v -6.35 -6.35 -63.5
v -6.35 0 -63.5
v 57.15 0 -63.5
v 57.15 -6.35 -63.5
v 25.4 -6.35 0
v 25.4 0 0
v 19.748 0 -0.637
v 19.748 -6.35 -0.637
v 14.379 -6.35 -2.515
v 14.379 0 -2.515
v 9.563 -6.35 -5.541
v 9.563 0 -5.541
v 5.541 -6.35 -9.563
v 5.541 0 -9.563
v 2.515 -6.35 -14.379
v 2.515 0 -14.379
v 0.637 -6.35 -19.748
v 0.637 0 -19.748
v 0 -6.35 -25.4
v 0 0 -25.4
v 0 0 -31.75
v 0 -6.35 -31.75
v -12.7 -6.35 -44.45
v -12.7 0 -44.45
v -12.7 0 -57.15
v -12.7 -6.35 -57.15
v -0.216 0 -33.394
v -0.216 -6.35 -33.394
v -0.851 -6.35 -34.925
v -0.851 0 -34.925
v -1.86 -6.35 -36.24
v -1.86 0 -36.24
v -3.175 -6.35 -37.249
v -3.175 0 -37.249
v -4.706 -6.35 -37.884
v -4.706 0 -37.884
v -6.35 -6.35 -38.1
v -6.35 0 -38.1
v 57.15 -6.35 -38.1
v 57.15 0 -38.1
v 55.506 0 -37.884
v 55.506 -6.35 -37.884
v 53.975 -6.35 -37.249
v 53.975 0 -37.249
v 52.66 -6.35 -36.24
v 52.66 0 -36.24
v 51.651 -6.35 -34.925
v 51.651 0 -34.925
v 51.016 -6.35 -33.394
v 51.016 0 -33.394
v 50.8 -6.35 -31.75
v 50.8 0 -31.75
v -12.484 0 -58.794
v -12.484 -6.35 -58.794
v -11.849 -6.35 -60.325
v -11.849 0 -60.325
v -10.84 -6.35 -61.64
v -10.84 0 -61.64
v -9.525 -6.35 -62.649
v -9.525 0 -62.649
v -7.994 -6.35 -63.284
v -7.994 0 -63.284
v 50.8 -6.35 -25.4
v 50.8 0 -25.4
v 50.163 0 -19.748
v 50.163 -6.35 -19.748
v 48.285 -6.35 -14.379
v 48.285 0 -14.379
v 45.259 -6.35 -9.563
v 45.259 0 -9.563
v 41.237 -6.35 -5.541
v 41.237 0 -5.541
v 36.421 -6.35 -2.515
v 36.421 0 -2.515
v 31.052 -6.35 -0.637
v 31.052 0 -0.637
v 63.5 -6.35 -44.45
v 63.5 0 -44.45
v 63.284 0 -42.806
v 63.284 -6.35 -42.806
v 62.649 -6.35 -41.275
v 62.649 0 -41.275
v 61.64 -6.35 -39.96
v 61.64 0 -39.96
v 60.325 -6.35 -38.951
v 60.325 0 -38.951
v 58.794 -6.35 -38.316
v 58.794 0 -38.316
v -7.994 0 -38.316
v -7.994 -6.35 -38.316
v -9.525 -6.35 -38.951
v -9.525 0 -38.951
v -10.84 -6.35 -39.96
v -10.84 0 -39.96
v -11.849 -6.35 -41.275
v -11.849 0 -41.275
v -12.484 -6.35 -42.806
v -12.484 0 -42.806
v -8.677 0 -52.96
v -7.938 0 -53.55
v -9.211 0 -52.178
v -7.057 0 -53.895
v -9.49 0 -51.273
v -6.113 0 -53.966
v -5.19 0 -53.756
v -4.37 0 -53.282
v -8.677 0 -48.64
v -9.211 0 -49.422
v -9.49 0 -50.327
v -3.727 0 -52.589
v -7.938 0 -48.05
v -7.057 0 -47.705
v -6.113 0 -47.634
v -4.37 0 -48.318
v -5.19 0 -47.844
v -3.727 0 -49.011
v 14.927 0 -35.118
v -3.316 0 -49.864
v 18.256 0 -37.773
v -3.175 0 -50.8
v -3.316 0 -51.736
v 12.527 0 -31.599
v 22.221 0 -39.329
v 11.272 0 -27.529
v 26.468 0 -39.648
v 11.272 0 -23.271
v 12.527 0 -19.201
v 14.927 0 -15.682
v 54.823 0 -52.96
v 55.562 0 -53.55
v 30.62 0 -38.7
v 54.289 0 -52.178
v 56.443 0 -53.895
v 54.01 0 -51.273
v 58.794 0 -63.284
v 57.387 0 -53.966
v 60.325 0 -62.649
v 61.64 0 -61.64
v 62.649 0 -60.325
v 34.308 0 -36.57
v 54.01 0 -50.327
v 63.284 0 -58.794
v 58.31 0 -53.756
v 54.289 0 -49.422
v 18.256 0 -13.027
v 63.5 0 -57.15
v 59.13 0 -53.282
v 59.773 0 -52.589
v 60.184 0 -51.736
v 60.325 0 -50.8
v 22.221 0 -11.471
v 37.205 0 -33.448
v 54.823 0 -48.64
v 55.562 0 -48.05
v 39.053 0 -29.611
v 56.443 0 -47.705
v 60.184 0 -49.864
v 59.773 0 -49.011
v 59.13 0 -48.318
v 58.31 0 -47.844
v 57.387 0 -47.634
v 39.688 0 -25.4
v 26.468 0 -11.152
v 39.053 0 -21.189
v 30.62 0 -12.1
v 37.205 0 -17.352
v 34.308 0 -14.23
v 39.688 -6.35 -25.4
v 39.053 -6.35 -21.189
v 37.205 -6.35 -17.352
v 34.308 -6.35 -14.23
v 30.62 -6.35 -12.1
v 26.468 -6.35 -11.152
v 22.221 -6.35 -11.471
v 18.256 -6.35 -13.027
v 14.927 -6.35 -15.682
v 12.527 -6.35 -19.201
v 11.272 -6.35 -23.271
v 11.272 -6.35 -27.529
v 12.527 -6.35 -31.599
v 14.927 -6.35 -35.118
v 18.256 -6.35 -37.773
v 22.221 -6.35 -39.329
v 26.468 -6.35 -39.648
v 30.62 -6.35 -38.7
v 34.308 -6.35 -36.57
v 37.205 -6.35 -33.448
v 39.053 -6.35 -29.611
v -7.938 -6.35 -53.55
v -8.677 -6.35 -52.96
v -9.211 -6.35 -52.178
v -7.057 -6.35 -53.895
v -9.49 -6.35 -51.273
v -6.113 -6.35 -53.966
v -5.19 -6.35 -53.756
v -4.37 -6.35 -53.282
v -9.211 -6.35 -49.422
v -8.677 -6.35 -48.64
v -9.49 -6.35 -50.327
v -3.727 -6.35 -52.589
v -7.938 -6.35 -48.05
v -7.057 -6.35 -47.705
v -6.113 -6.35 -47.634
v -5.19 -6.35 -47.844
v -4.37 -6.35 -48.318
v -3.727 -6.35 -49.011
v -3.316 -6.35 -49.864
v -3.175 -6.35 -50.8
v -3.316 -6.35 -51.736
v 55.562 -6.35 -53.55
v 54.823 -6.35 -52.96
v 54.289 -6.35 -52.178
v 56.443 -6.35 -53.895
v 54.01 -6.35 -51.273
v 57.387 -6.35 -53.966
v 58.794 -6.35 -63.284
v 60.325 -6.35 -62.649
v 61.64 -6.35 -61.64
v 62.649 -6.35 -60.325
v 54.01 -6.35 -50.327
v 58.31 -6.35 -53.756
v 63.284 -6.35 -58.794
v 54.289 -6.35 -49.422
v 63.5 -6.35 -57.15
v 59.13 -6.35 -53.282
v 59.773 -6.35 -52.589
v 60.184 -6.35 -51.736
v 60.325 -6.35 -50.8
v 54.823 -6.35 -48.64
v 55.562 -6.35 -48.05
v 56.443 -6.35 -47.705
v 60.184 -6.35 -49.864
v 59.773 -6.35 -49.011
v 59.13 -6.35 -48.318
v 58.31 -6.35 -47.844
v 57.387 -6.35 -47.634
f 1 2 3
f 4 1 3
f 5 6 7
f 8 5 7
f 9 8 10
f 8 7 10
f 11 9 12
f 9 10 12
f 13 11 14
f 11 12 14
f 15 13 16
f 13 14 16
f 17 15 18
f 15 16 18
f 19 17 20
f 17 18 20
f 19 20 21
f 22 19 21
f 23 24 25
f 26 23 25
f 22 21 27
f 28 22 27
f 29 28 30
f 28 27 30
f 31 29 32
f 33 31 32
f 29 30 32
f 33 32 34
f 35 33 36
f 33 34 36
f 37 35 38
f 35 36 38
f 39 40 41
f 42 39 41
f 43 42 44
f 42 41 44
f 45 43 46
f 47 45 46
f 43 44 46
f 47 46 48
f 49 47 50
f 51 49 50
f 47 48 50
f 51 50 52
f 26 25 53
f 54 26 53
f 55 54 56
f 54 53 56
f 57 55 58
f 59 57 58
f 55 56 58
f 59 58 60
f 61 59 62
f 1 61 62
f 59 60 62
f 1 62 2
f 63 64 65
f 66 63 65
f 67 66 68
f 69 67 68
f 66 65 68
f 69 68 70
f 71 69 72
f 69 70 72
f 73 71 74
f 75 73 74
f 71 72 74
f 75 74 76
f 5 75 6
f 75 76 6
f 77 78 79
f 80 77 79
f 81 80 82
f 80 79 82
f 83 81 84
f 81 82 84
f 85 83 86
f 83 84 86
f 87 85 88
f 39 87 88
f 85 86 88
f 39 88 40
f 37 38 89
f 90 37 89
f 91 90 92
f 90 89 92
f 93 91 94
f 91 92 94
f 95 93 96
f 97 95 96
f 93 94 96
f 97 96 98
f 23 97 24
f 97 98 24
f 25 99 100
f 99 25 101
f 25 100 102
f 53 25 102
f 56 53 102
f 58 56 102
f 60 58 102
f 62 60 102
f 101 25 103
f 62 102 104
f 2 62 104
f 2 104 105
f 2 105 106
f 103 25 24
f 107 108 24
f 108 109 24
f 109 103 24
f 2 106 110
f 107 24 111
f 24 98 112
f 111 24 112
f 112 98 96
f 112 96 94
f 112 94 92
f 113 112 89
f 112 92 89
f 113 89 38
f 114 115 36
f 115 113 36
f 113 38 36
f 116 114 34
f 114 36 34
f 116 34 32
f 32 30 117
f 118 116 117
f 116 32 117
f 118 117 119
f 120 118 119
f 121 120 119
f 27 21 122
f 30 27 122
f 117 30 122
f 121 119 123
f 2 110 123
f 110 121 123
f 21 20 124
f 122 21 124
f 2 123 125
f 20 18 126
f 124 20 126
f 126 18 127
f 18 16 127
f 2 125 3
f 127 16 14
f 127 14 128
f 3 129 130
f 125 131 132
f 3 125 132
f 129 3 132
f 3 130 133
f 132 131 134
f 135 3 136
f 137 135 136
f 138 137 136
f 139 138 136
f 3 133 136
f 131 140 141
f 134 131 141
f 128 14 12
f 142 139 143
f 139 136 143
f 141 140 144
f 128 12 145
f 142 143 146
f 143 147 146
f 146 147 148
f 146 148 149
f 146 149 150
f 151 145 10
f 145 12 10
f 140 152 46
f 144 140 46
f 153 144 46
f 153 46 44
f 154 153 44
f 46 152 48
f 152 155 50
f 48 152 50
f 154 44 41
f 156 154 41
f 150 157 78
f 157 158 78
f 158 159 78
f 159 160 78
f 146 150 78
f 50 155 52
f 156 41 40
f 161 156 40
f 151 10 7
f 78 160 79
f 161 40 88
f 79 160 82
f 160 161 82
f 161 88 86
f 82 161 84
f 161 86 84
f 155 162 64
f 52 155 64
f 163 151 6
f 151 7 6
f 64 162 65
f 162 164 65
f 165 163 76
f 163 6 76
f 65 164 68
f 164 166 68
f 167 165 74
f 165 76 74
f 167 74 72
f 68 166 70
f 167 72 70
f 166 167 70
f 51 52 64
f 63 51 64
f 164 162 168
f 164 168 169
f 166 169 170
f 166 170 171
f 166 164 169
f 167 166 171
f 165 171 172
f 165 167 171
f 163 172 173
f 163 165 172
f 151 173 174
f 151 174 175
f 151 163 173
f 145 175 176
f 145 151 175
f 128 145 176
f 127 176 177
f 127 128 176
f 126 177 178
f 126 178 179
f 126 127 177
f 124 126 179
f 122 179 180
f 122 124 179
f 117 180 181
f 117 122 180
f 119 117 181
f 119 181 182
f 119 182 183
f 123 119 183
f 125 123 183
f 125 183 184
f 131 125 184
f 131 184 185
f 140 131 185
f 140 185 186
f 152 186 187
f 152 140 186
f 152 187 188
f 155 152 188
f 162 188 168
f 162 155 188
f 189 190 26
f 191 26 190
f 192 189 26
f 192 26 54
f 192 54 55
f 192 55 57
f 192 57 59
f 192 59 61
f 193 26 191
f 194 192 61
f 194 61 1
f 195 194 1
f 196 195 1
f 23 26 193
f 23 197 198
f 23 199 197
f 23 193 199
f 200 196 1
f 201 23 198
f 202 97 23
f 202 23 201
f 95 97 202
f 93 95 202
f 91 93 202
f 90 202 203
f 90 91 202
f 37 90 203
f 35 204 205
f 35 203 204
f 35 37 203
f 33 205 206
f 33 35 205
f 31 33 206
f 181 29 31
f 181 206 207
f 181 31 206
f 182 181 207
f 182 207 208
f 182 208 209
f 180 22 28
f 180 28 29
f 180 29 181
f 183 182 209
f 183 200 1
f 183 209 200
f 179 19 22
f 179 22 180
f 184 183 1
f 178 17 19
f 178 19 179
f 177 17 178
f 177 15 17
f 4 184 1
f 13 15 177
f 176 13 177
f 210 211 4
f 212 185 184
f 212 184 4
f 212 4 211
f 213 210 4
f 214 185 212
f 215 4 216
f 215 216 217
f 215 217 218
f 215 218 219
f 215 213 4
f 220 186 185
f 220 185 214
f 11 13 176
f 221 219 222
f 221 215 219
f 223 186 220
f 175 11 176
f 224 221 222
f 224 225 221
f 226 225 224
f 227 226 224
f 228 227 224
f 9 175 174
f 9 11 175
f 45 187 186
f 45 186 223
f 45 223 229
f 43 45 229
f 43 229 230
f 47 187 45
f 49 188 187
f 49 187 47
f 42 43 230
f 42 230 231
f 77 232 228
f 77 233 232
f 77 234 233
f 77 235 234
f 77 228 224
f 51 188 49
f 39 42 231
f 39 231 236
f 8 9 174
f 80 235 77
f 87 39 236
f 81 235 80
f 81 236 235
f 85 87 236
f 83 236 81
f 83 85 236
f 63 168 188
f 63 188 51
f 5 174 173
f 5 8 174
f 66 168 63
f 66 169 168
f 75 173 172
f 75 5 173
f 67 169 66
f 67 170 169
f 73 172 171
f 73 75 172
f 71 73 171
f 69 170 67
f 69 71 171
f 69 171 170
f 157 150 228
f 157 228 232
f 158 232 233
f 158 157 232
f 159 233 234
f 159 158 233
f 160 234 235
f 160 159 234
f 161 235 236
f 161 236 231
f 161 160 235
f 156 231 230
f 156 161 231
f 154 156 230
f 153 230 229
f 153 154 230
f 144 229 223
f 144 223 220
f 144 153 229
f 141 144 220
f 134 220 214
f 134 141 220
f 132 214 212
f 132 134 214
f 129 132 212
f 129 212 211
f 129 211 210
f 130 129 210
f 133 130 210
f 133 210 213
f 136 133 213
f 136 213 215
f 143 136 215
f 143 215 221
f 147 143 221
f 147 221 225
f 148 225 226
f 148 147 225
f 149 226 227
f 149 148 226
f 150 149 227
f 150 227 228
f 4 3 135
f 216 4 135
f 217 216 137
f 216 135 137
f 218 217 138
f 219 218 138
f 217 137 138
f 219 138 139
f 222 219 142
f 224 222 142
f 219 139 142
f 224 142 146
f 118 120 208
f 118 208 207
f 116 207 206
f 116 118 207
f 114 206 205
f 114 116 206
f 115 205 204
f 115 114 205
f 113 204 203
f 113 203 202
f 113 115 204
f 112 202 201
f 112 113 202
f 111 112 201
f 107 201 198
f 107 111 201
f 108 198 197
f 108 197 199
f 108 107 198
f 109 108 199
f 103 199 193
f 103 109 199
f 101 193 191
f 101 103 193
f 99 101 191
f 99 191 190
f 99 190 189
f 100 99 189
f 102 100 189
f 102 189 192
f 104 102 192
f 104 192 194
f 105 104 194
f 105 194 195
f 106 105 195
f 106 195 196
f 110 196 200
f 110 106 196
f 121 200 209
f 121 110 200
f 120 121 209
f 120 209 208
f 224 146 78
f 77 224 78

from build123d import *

# Parameters (mm, degrees)
F0_R     = 3.175
F0_R_2   = 14.2875
F1_DEPTH = 6.35


with BuildPart() as f1:
    # F0 (on Front) → F1 (new body)
    with BuildSketch(Plane.XZ):
        with BuildLine():
            Line((-6.35, -63.5), (0, -63.5))
            Line((0, -63.5), (50.8, -63.5))
            Line((50.8, -63.5), (57.15, -63.5))
            ThreePointArc((57.15, -63.5), (61.640128, -61.640128), (63.5, -57.15))
            Line((63.5, -57.15), (63.5, -44.45))
            ThreePointArc((63.5, -44.45), (61.640128, -39.959872), (57.15, -38.1))
            ThreePointArc((57.15, -38.1), (52.659872, -36.240128), (50.8, -31.75))
            Line((50.8, -31.75), (50.8, -25.4))
            ThreePointArc((50.8, -25.4), (43.360512, -7.439488), (25.4, 0))
            ThreePointArc((25.4, 0), (7.439488, -7.439488), (0, -25.4))
            Line((0, -25.4), (0, -31.75))
            ThreePointArc((0, -31.75), (-1.859872, -36.240128), (-6.35, -38.1))
            ThreePointArc((-6.35, -38.1), (-10.840128, -39.959872), (-12.7, -44.45))
            Line((-12.7, -44.45), (-12.7, -57.15))
            ThreePointArc((-12.7, -57.15), (-10.840128, -61.640128), (-6.35, -63.5))
        make_face()
        with Locations((-6.35, -50.8)):
            Circle(F0_R, mode=Mode.SUBTRACT)
        with Locations((57.15, -50.8)):
            Circle(F0_R, mode=Mode.SUBTRACT)
        with Locations((25.4, -25.4)):
            Circle(F0_R_2, mode=Mode.SUBTRACT)
    extrude(amount=F1_DEPTH)


solid = f1.part
